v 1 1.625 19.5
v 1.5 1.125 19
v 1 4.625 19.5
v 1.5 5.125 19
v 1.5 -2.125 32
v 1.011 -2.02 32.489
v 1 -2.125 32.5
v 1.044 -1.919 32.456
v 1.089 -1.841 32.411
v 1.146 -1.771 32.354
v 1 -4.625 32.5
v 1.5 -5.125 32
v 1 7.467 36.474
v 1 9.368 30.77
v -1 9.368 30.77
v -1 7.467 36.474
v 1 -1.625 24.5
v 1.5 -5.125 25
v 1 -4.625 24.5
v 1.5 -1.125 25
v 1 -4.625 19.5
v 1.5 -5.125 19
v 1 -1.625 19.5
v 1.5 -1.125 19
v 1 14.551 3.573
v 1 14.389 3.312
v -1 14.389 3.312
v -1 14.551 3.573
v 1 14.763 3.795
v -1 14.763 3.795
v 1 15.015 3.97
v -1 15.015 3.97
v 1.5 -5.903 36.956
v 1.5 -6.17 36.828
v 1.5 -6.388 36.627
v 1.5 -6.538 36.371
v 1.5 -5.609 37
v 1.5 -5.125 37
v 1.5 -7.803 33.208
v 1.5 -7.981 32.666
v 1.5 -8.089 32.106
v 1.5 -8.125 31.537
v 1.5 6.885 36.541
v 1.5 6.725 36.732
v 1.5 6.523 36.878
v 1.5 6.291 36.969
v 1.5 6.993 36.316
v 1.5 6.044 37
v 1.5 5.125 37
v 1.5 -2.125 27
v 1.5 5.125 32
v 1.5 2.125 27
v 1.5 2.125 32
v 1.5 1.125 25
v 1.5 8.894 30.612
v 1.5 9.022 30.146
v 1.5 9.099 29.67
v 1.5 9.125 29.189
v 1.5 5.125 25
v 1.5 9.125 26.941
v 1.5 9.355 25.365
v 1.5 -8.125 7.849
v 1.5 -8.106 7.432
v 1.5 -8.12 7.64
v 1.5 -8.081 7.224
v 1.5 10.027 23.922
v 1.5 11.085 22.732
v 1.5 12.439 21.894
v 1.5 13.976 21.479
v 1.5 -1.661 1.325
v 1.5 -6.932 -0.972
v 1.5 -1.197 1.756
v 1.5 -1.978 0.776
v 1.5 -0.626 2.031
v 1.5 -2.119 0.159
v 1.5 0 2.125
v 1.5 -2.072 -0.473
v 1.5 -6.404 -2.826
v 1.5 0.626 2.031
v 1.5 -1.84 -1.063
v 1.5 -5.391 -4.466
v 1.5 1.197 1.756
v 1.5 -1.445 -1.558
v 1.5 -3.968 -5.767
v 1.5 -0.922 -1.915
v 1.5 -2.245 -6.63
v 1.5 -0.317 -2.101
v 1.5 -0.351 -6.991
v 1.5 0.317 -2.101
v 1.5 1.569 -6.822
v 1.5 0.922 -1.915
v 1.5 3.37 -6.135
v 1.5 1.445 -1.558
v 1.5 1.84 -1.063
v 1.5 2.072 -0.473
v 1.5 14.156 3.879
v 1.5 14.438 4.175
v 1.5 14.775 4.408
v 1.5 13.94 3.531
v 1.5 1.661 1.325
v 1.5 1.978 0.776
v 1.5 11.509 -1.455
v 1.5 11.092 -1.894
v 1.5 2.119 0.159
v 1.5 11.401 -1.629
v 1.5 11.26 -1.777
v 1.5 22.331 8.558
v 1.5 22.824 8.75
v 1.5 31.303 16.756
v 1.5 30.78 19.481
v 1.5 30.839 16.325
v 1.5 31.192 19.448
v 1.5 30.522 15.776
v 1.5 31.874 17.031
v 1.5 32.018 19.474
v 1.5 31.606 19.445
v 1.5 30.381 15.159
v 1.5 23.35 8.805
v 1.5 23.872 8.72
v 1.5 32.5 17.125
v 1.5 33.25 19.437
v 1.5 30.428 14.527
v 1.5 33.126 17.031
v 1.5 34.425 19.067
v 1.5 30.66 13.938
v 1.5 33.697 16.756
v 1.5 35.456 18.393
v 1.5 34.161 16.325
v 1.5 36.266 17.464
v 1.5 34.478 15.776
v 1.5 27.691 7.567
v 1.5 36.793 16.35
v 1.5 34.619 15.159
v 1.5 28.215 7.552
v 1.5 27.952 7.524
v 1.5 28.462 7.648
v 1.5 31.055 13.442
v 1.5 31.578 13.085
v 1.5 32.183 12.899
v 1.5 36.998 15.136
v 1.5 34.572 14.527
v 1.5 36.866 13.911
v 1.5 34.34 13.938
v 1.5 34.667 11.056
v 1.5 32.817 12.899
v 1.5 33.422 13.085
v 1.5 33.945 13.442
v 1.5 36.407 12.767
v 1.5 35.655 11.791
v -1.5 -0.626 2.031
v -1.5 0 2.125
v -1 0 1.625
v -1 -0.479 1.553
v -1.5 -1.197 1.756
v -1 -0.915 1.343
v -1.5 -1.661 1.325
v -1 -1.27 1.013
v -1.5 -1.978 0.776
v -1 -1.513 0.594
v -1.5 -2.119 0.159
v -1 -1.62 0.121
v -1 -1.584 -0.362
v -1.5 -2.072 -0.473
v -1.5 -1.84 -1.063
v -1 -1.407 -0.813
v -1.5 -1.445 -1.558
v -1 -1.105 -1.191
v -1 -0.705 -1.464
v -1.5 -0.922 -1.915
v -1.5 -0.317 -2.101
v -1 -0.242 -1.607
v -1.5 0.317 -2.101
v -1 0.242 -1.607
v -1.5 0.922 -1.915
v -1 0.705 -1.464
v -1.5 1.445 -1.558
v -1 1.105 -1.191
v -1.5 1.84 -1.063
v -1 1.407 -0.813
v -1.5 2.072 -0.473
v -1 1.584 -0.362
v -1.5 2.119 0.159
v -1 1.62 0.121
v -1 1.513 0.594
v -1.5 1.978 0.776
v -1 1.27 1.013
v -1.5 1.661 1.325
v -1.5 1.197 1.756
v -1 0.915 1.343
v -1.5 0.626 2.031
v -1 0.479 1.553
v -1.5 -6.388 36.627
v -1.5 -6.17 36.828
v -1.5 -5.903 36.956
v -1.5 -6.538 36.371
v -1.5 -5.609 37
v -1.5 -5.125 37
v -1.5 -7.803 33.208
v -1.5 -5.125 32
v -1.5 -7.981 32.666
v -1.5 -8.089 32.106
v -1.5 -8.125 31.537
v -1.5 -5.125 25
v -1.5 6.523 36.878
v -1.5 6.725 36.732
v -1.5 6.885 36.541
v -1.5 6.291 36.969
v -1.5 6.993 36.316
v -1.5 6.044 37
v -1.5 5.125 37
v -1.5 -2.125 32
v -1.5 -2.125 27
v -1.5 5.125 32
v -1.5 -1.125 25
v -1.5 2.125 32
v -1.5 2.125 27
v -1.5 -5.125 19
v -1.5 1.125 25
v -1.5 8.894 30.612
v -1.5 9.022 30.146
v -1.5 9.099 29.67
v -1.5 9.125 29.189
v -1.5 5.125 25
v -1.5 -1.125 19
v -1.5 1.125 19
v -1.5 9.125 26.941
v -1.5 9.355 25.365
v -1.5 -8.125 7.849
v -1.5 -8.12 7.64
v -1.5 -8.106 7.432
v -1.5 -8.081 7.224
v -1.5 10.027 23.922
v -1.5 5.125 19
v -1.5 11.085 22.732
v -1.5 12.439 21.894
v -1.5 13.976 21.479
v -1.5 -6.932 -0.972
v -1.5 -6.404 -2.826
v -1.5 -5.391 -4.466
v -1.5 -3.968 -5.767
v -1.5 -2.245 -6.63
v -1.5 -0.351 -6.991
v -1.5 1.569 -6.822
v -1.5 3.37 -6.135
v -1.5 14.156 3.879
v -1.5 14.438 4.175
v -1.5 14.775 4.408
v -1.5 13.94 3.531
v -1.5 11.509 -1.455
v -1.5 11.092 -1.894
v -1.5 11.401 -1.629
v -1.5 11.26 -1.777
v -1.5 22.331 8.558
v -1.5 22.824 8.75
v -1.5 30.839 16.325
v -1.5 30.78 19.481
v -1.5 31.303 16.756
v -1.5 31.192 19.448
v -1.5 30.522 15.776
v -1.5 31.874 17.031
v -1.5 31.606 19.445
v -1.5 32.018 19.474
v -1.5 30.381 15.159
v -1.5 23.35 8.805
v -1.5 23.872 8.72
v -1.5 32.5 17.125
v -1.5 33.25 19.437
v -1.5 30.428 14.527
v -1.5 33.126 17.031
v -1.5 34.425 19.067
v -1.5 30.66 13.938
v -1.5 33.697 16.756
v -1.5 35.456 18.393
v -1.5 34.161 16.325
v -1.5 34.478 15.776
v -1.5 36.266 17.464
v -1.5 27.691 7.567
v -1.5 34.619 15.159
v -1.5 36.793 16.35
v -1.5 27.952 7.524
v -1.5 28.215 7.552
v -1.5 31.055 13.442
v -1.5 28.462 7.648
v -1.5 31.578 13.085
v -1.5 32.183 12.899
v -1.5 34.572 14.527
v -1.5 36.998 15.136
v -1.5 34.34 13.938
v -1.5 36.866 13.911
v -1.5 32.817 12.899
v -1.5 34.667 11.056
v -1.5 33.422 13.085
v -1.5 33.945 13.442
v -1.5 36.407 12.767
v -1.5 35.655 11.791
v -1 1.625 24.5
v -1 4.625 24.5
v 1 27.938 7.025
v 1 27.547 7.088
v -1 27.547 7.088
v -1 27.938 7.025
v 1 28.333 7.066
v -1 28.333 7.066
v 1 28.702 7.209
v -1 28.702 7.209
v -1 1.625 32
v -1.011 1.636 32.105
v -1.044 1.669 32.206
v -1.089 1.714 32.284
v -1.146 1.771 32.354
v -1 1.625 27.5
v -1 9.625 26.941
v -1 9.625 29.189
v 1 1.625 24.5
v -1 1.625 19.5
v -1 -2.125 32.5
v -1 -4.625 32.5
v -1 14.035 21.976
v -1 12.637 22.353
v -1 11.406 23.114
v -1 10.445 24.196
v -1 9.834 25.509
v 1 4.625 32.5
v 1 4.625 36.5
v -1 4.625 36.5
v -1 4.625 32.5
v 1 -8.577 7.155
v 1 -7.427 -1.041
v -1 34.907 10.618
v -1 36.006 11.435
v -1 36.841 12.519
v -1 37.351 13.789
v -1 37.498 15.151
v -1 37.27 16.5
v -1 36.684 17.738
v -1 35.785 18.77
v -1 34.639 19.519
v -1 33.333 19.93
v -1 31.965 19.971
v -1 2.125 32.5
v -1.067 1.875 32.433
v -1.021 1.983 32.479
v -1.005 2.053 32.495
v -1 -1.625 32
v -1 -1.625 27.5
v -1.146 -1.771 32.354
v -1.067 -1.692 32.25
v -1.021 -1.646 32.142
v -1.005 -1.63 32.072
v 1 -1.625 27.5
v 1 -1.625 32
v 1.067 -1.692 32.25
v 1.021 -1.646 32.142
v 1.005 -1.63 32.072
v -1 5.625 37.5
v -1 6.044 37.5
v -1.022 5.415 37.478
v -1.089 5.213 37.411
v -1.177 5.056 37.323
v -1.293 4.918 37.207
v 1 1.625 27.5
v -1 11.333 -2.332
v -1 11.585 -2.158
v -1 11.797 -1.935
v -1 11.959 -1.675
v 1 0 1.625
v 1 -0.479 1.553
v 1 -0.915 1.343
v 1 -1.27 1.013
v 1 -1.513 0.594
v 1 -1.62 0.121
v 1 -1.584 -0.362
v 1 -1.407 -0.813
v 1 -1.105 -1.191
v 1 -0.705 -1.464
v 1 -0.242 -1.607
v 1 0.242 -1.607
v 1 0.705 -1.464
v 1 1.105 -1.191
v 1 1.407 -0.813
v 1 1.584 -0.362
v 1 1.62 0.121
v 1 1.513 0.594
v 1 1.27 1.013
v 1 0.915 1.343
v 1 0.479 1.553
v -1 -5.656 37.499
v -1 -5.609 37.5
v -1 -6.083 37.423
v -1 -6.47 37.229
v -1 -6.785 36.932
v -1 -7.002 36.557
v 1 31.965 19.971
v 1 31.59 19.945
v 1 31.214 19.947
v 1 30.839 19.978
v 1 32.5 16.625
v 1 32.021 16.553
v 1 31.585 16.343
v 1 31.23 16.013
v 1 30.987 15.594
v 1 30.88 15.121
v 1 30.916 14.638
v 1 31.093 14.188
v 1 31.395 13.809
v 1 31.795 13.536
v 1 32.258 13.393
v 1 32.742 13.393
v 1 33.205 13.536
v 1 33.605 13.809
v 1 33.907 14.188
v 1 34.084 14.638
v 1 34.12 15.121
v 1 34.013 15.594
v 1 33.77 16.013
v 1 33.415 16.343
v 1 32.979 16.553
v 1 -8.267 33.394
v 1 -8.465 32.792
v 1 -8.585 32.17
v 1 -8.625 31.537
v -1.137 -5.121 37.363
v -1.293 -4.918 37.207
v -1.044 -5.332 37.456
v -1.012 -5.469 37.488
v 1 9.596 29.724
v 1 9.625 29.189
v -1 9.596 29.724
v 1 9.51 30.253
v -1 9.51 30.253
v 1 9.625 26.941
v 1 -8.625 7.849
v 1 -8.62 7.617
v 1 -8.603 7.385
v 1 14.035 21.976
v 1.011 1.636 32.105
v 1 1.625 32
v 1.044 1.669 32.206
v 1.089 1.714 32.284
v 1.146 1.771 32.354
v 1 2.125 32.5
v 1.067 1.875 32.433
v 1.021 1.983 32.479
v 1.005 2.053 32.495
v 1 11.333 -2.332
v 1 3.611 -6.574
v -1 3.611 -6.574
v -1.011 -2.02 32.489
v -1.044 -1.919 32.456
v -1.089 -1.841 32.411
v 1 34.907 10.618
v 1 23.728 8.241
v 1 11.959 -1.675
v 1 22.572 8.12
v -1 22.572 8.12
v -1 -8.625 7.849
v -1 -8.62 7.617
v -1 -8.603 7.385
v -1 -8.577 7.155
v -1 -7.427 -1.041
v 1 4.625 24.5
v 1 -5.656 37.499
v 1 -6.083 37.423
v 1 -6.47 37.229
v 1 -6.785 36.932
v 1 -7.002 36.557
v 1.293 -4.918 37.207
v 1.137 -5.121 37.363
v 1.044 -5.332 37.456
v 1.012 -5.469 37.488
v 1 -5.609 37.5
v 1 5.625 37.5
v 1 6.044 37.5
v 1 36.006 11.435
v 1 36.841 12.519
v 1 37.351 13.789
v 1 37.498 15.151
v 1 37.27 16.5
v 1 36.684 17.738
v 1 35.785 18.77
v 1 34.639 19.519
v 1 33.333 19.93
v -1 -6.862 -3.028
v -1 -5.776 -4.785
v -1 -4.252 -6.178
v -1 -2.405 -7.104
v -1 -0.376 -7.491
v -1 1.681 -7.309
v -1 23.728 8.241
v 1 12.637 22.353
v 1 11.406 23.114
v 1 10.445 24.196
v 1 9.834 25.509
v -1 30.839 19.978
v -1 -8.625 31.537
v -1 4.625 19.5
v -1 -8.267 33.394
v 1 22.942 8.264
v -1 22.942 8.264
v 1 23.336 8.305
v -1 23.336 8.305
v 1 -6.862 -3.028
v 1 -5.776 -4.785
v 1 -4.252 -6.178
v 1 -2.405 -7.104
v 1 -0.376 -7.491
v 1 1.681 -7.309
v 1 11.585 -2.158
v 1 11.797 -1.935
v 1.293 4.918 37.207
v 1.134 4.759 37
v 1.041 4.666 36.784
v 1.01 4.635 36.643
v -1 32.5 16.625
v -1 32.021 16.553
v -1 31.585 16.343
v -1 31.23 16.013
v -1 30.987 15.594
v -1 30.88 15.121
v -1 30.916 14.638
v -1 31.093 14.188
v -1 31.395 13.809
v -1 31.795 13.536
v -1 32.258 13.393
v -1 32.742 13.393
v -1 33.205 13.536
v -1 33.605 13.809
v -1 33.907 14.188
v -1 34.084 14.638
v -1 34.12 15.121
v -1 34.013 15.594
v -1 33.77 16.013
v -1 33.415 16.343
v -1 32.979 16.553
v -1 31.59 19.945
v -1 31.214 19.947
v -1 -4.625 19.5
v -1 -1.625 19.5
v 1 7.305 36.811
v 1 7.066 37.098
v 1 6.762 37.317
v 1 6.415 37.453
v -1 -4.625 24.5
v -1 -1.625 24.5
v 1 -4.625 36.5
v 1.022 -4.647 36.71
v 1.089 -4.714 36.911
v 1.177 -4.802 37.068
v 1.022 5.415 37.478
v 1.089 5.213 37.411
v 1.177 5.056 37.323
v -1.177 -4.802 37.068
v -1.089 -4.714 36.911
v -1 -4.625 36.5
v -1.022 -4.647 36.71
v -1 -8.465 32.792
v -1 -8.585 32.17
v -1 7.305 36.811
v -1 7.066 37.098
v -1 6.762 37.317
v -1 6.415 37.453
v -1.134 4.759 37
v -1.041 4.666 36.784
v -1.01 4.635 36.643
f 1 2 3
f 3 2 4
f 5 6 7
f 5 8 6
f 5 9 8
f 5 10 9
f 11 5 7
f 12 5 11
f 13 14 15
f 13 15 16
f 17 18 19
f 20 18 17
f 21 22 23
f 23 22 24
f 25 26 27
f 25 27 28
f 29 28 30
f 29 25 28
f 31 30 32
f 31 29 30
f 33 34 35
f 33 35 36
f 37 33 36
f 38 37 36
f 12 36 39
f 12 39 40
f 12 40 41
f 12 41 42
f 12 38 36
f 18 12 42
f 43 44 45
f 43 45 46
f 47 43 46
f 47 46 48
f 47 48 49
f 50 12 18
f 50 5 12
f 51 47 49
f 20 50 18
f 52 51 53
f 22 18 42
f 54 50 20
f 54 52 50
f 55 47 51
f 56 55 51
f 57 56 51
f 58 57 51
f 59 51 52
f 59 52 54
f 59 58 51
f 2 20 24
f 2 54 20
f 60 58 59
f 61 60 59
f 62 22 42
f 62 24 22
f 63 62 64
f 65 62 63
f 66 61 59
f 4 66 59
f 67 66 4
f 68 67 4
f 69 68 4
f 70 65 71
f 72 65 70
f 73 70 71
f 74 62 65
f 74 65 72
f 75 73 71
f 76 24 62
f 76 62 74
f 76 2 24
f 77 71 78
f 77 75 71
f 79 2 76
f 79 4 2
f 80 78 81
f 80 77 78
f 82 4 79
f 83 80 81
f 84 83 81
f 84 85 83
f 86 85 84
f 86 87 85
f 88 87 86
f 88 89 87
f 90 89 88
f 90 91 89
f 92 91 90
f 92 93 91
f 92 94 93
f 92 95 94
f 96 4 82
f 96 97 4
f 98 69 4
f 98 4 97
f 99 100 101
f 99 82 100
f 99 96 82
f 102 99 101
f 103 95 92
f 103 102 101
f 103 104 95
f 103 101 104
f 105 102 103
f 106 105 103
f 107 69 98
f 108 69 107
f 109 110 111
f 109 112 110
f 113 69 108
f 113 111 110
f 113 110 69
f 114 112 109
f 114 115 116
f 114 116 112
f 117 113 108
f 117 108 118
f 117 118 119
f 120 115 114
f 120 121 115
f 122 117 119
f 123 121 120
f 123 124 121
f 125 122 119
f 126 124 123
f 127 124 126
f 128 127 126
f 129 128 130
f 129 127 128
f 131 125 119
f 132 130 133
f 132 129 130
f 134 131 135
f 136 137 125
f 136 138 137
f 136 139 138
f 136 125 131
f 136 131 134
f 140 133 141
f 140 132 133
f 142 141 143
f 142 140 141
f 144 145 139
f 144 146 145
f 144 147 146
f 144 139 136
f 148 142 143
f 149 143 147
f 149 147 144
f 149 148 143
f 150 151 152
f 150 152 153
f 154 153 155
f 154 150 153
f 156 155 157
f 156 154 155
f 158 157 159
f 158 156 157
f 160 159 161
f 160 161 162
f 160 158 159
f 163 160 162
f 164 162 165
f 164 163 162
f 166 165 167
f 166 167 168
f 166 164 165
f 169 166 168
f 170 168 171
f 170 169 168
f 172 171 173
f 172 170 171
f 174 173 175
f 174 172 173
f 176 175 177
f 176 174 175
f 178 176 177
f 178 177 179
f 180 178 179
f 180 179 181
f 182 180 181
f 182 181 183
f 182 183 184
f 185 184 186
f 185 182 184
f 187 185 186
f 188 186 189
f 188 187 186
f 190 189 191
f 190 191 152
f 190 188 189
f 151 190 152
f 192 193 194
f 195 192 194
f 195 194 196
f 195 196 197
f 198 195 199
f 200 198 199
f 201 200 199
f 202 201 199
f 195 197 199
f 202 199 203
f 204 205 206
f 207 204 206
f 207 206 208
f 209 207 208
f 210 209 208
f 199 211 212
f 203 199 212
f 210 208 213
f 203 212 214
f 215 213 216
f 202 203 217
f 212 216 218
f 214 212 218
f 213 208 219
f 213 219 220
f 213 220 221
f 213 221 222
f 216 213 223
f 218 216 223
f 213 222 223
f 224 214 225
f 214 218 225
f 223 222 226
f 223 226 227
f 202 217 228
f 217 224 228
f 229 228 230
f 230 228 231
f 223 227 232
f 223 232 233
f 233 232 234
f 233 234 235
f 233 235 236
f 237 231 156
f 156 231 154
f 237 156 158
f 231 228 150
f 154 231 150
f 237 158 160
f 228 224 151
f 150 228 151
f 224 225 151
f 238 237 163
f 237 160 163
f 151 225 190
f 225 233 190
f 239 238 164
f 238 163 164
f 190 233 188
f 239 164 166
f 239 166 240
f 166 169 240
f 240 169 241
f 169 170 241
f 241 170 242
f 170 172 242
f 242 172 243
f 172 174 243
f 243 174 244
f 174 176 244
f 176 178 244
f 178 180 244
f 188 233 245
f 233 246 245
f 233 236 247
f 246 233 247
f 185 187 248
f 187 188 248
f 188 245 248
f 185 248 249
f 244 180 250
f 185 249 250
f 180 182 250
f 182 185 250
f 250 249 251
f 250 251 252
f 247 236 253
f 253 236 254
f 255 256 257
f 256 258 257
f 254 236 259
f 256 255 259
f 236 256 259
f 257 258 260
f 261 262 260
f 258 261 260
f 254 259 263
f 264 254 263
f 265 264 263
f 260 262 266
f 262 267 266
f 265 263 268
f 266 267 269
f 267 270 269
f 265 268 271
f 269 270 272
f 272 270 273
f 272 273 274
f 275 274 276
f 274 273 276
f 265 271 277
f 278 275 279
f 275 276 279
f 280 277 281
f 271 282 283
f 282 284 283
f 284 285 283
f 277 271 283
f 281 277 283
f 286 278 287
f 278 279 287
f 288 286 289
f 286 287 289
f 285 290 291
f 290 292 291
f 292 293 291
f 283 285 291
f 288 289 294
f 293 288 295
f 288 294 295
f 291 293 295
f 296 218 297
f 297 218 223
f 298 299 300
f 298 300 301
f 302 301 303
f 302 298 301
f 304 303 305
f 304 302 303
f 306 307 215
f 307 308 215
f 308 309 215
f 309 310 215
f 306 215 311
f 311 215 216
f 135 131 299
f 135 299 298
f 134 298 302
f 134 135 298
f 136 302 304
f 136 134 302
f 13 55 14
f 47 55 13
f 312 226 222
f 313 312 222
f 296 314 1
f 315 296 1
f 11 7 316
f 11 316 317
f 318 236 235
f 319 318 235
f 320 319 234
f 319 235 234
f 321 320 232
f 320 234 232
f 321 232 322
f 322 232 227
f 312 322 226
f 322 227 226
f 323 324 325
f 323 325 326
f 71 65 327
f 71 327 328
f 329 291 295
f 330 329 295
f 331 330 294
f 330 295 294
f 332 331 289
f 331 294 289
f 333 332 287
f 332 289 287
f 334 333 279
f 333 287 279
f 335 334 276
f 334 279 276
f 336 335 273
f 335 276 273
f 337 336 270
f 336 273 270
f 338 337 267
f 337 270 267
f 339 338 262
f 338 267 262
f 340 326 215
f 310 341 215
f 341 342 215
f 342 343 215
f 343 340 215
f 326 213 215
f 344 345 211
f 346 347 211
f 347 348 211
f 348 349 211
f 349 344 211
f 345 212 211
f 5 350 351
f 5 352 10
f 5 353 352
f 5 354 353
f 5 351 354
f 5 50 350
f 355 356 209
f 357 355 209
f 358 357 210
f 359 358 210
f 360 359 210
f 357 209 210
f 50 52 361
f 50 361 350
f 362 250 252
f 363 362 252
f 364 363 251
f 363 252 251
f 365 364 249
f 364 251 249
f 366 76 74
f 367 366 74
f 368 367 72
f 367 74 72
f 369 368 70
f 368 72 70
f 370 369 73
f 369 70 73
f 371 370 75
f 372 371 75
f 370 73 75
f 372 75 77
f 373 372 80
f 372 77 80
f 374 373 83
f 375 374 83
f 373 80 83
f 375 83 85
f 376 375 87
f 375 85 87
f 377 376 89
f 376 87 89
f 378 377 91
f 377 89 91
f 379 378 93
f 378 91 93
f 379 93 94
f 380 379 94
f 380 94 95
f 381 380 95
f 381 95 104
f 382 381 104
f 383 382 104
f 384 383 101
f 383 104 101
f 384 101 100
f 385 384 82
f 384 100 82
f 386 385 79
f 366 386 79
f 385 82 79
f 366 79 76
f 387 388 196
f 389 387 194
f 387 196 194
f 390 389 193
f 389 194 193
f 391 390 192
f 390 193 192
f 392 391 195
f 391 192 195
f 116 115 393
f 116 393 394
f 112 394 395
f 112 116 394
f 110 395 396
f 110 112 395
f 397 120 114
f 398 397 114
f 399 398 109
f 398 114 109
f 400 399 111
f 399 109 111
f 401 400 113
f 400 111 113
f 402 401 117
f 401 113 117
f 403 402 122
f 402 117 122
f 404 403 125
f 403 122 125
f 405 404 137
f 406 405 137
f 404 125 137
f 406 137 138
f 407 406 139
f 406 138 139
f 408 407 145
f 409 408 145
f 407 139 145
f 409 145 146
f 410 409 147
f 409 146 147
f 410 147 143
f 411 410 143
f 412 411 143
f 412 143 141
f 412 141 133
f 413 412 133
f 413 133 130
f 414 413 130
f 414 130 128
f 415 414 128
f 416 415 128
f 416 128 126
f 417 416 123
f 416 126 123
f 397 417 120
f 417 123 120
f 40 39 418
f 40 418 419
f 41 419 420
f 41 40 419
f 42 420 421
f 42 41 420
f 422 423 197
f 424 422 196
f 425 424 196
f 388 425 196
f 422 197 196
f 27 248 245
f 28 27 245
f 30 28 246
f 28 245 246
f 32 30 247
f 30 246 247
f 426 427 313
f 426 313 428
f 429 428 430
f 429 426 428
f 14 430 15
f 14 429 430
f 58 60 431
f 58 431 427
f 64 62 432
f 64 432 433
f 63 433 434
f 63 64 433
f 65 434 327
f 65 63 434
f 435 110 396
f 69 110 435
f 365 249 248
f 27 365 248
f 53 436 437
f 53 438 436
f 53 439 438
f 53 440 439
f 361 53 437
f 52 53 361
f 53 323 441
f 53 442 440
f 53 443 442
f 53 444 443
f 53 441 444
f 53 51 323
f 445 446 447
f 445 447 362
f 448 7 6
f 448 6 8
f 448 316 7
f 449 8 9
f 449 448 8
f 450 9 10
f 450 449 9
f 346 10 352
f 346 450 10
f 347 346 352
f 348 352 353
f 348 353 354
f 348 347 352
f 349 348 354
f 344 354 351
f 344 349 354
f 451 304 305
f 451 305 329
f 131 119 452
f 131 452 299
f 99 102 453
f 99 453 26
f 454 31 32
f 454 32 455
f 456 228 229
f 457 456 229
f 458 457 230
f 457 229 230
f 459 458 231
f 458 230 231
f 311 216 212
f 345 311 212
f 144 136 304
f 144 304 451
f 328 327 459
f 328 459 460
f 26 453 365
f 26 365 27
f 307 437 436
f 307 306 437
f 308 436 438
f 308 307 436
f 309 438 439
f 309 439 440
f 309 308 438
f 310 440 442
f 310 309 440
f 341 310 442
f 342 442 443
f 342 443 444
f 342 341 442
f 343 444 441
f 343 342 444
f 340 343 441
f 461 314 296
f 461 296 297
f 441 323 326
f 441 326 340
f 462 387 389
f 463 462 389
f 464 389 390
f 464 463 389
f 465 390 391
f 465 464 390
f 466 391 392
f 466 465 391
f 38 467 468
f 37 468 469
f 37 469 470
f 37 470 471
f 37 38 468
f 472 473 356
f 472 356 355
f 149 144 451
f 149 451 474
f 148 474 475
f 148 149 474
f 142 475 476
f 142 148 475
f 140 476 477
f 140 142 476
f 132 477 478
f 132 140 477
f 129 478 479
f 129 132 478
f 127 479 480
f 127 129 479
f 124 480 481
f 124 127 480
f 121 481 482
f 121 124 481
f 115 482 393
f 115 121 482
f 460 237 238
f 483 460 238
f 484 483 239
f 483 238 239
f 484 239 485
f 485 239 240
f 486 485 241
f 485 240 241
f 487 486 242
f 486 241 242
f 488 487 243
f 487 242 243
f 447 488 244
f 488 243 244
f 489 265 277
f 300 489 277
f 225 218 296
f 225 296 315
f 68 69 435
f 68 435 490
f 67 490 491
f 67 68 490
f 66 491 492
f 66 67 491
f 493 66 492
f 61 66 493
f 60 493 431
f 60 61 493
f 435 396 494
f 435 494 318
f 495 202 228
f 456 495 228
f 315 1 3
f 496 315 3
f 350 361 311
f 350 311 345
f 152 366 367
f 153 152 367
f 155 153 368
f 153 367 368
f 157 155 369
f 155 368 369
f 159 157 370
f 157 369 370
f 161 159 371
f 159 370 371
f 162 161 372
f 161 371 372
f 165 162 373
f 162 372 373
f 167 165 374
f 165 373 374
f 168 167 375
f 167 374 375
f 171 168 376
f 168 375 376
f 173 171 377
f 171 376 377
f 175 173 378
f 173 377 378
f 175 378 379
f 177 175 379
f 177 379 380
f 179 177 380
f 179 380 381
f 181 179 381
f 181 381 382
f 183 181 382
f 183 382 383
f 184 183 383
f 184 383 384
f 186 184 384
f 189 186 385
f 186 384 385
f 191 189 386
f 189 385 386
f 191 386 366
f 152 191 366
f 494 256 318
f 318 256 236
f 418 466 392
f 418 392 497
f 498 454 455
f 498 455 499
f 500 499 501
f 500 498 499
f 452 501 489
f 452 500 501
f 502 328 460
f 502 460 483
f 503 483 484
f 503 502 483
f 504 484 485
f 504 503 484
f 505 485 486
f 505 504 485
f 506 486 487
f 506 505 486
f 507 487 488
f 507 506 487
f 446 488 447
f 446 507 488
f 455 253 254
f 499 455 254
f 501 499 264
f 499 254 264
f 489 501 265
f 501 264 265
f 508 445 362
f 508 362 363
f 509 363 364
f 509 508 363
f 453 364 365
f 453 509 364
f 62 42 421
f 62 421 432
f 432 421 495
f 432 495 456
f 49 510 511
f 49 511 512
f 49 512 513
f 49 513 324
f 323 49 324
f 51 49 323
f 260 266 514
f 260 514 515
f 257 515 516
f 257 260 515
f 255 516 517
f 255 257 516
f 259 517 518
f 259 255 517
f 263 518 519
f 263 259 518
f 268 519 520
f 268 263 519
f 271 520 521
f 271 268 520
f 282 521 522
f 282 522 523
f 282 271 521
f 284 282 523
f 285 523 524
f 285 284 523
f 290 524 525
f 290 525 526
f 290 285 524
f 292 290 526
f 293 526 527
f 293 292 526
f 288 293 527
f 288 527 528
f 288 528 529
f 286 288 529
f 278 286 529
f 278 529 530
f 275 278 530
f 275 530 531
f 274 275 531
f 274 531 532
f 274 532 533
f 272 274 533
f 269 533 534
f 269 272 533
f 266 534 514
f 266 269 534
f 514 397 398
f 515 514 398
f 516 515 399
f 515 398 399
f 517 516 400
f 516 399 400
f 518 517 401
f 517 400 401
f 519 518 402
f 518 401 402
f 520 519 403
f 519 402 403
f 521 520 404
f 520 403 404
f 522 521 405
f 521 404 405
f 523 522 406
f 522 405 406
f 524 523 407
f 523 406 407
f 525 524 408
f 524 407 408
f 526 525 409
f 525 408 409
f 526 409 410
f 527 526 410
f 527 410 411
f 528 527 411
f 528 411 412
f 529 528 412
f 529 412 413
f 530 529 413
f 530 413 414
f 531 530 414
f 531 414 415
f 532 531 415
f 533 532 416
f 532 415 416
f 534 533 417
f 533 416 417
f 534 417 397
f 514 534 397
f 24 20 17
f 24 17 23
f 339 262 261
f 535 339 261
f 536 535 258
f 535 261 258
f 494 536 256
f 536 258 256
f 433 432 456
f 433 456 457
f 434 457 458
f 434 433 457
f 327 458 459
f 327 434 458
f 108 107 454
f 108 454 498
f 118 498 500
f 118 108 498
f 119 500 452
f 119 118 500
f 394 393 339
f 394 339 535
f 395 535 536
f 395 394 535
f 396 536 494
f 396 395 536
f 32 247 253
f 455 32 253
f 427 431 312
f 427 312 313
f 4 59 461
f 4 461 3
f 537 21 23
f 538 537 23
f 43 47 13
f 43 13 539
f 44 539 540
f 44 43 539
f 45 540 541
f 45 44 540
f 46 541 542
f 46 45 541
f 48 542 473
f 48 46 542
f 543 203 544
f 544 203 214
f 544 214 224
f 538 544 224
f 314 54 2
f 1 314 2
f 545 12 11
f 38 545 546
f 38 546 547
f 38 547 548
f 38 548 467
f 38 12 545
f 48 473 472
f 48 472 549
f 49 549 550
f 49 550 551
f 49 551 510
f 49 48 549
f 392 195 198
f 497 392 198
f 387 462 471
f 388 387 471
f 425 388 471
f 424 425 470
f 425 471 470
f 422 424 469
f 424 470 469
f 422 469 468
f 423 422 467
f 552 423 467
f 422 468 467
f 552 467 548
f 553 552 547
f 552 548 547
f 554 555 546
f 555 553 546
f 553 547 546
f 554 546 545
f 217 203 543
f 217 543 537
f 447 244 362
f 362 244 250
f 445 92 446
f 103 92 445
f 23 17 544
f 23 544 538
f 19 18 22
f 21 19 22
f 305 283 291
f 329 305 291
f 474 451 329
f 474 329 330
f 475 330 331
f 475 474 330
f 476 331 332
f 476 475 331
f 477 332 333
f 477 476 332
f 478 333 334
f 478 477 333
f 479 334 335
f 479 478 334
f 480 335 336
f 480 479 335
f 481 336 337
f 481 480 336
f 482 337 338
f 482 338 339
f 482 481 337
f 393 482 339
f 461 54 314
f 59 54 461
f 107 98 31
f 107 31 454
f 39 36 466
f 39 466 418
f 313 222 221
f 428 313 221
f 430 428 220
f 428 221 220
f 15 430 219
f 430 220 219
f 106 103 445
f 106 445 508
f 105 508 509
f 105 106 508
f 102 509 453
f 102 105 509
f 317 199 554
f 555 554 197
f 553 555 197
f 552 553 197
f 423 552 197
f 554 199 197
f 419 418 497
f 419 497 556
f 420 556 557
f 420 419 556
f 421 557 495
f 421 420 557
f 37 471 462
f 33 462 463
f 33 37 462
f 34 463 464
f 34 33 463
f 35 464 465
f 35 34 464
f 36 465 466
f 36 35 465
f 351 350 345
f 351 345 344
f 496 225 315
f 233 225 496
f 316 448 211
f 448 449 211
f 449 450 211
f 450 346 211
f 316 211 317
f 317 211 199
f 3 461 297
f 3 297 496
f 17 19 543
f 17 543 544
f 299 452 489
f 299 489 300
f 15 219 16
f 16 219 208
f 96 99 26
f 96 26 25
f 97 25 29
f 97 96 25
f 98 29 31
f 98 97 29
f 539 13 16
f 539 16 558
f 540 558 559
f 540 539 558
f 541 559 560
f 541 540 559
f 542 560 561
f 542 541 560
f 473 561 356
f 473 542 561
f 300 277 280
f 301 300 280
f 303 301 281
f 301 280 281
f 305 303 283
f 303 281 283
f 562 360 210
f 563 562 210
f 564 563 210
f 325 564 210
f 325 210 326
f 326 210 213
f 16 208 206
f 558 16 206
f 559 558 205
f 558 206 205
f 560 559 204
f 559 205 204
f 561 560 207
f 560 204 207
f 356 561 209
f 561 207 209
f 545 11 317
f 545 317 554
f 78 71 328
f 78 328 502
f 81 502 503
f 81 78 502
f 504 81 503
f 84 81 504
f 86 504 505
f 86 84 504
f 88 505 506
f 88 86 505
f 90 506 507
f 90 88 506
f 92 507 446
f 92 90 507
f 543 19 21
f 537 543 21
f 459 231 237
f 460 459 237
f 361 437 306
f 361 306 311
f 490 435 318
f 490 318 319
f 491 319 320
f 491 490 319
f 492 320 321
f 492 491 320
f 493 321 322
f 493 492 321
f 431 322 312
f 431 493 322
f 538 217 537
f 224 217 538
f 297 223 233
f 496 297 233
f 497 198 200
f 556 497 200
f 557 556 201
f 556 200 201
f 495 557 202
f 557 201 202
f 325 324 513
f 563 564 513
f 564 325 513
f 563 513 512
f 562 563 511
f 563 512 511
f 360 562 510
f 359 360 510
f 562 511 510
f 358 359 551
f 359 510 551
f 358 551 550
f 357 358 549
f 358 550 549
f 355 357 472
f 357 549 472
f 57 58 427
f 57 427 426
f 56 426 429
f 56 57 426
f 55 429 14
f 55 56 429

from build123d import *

# Parameters (mm, degrees)
SKETCH_1_R      = 1.625
SKETCH_1_W      = 5
SKETCH_1_H      = 3
EXTRUDE_1_DEPTH = 3
CHAMFER_1_SIZE  = 0.5
FILLET_1_R      = 1
FILLET_2_R      = 0.5
EXTRUDE_2_DEPTH = 3


with BuildPart() as part:
    # 草图1 → 凸台-拉伸1 (new body)
    with BuildSketch(Plane(origin=(1.5, 0, 0), x_dir=(0, 0, -1), z_dir=(1, 0, 0))):
        with BuildLine():
            Line((-7.154542269, -8.576560818), (1.041442411, -7.427341227))
            ThreePointArc((1.041442411, -7.427341227), (6.705040976, -3.360420437), (6.573553871, 3.610871017))
            Line((6.573553871, 3.610871017), (2.332034096, 11.332514521))
            ThreePointArc((2.332034096, 11.332514521), (2.051803428, 11.696549741), (1.674538126, 11.958698097))
            Line((1.674538126, 11.958698097), (-3.312005463, 14.389232718))
            ThreePointArc((-3.312005463, 14.389232718), (-3.689270765, 14.651381075), (-3.969501433, 15.015416295))
            Line((-3.969501433, 15.015416295), (-8.120214479, 22.571747074))
            ThreePointArc((-8.120214479, 22.571747074), (-8.297319992, 23.137447109), (-8.241448295, 23.727583743))
            Line((-8.241448295, 23.727583743), (-7.088083158, 27.546610192))
            ThreePointArc((-7.088083158, 27.546610192), (-7.032211461, 28.136746826), (-7.209316974, 28.702446861))
            Line((-7.209316974, 28.702446861), (-10.617630753, 34.907247345))
            ThreePointArc((-10.617630753, 34.907247345), (-16.500374515, 37.269578211), (-19.97127937, 31.964853827))
            ThreePointArc((-19.97127937, 31.964853827), (-19.942635933, 31.401924032), (-19.977533596, 30.839347323))
            Line((-19.977533596, 30.839347323), (-21.975677109, 14.034639668))
            ThreePointArc((-21.975677109, 14.034639668), (-23.620446364, 10.886564387), (-26.940702253, 9.625))
            Line((-26.940702253, 9.625), (-29.188611699, 9.625))
            ThreePointArc((-29.188611699, 9.625), (-29.989522914, 9.560437288), (-30.769750529, 9.36841649))
            Line((-30.769750529, 9.36841649), (-36.474341649, 7.466886117))
            ThreePointArc((-36.474341649, 7.466886117), (-37.216863278, 6.920926597), (-37.5, 6.04386117))
            Line((-37.5, 6.04386117), (-37.5, 4.625))
            Line((-37.5, 4.625), (-32.5, 4.625))
            Line((-32.5, 4.625), (-32.5, 1.625))
            Line((-32.5, 1.625), (-27.5, 1.625))
            Line((-27.5, 1.625), (-27.5, -1.625))
            Line((-27.5, -1.625), (-32.5, -1.625))
            Line((-32.5, -1.625), (-32.5, -4.625))
            Line((-32.5, -4.625), (-37.5, -4.625))
            Line((-37.5, -4.625), (-37.5, -5.609450558))
            ThreePointArc((-37.5, -5.609450558), (-37.242100846, -6.450393772), (-36.557086015, -7.002165594))
            Line((-36.557086015, -7.002165594), (-33.394041364, -8.267383454))
            ThreePointArc((-33.394041364, -8.267383454), (-32.482625588, -8.534781934), (-31.537087982, -8.625))
            Line((-31.537087982, -8.625), (-7.848837209, -8.625))
            ThreePointArc((-7.848837209, -8.625), (-7.500845895, -8.612875504), (-7.154542269, -8.576560818))
        make_face()
        with Locations(Location((-15, 32.5, 0), (0, 0, 180))):
            Circle(SKETCH_1_R, mode=Mode.SUBTRACT)
        with Locations(Location((0, 0, 0), (0, 0, 180))):
            Circle(SKETCH_1_R, mode=Mode.SUBTRACT)
        with Locations((-22, 3.125)):
            Rectangle(SKETCH_1_W, SKETCH_1_H, mode=Mode.SUBTRACT)
        with Locations((-22, -3.125)):
            Rectangle(SKETCH_1_W, SKETCH_1_H, mode=Mode.SUBTRACT)
        with BuildLine():
            Line((-9.961966793, 5.476712688), (-17.295484898, 21.366001917))
            ThreePointArc((-17.295484898, 21.366001917), (-16.439907786, 23.68828265), (-14.117627052, 22.832705538))
            Line((-14.117627052, 22.832705538), (-6.784108947, 6.943416309))
            ThreePointArc((-6.784108947, 6.943416309), (-7.639686059, 4.621135575), (-9.961966793, 5.476712688))
        make_face(mode=Mode.SUBTRACT)
    extrude(amount=-EXTRUDE_1_DEPTH)

    # 倒角1
    chamfer_1_edges = [part.edges().sort_by_distance(p)[0] for p in [
        (-1.5, 0, 27.5),
        (-1.5, -3.125, 24.5),
        (-1.5, -1.625, 22),
        (-1.5, -3.125, 19.5),
        (-1.5, -4.625, 22),
        (1.5, -3.125, 24.5),
        (1.5, -4.625, 22),
        (1.5, -3.125, 19.5),
        (-1.5, -1.625, 30),
        (1.5, -1.625, 22),
        (-1.5, -3.125, 32.5),
        (-1.5, -4.625, 35),
        (-1.5, 4.621135575, 7.639686059),
        (-1.5, 13.421357302, 13.628725845),
        (-1.5, 23.68828265, 16.439907786),
        (-1.5, 14.888060923, 10.450868),
        (-1.5, -5.117225279, 37.5),
        (1.5, 4.621135575, 7.639686059),
        (1.5, 14.888060923, 10.450868),
        (1.5, 23.68828265, 16.439907786),
        (1.5, 13.421357302, 13.628725845),
        (-1.5, -6.450393772, 37.242100846),
        (-1.5, -7.634774524, 34.975563689),
        (-1.5, -8.534781934, 32.482625588),
        (-1.5, -3.360420437, -6.705040976),
        (-1.5, -8.625, 19.692962596),
        (-1.5, 7.471692769, -4.452793984),
        (-1.5, 11.696549741, -2.051803428),
        (-1.5, 13.173965408, 0.818733668),
        (-1.5, 14.651381075, 3.689270765),
        (1.5, -8.625, 19.692962596),
        (1.5, -8.534781934, 32.482625588),
        (1.5, -7.634774524, 34.975563689),
        (1.5, -6.450393772, 37.242100846),
        (1.5, -5.117225279, 37.5),
        (-1.5, 18.793581684, 6.044857956),
        (1.5, -4.625, 35),
        (1.5, -3.125, 32.5),
        (1.5, -1.625, 30),
        (1.5, 0, 27.5),
        (1.5, 1.625, 30),
        (1.5, 3.125, 32.5),
        (1.5, 4.625, 35),
        (1.5, 5.334430585, 37.5),
        (1.5, 6.920926597, 37.216863278),
        (1.5, 8.417651304, 33.622046089),
        (-1.5, 23.137447109, 8.297319992),
        (1.5, 9.560437288, 29.989522914),
        (1.5, 9.625, 28.064656976),
        (1.5, 10.886564387, 23.620446364),
        (1.5, 22.436993496, 20.976605353),
        (1.5, 31.401924032, 19.942635933),
        (1.5, 37.269578211, 16.500374515),
        (1.5, 31.804847103, 8.913473863),
        (1.5, 28.136746826, 7.032211461),
        (1.5, 25.637096968, 7.664765726),
        (1.5, 23.137447109, 8.297319992),
        (-1.5, 25.637096968, 7.664765726),
        (1.5, 18.793581684, 6.044857956),
        (1.5, 14.651381075, 3.689270765),
        (1.5, 13.173965408, 0.818733668),
        (1.5, 11.696549741, -2.051803428),
        (1.5, 7.471692769, -4.452793984),
        (1.5, -3.360420437, -6.705040976),
        (1.5, -8.001951023, 3.056549929),
        (1.5, -8.612875504, 7.500845895),
        (-1.5, 28.136746826, 7.032211461),
        (-1.5, 31.804847103, 8.913473863),
        (-1.5, -8.612875504, 7.500845895),
        (-1.5, 37.269578211, 16.500374515),
        (-1.5, 31.401924032, 19.942635933),
        (-1.5, 22.436993496, 20.976605353),
        (-1.5, 10.886564387, 23.620446364),
        (-1.5, 9.625, 28.064656976),
        (-1.5, 9.560437288, 29.989522914),
        (-1.5, 8.417651304, 33.622046089),
        (-1.5, 32.5, 13.375),
        (1.5, 32.5, 13.375),
        (-1.5, 6.920926597, 37.216863278),
        (-1.5, 0, -1.625),
        (1.5, 0, -1.625),
        (-1.5, 5.334430585, 37.5),
        (-1.5, 4.625, 35),
        (-1.5, 3.125, 19.5),
        (-1.5, -8.001951023, 3.056549929),
        (-1.5, 1.625, 22),
        (-1.5, 3.125, 24.5),
        (-1.5, 4.625, 22),
        (1.5, 3.125, 19.5),
        (1.5, 4.625, 22),
        (1.5, 3.125, 24.5),
        (1.5, 1.625, 22),
        (-1.5, 3.125, 32.5),
        (-1.5, 1.625, 30),
    ]]
    chamfer(chamfer_1_edges, length=CHAMFER_1_SIZE)

    # 圆角1
    # the kernel refuses this fillet: 1 mm, written as the material it takes off along each edge
    with BuildSketch(Plane(origin=(3.577747849, -4.625, 37.5), x_dir=(0, -0.9999997524396673, -0.000703648068189184), z_dir=(-1, 0, 0))) as fillet_1_piece_1:
        with BuildLine():
            CenterArc((1.000703571, -0.999537948), FILLET_1_R, 88.258193912, 91.782122156)
            Line((0.000703818, -1.000241596), (-0.099296157, -1.000311961))
            Line((-0.099296157, -1.000311961), (-0.099999975, -7.0365e-05))
            Line((-0.099999975, -7.0365e-05), (-7.0365e-05, 0.099999975))
            ThreePointArc((-7.0365e-05, 0.099999975), (0.984379949, 0.100692682), (1.034138696, 0.099953795))
            Line((1.034138696, 0.099953795), (1.03109914, 0))
        make_face()
    extrude(amount=7.155495698, mode=Mode.SUBTRACT)
    with BuildSketch(Plane(origin=(3.5, 4.625, 37.5), x_dir=(0, 0, -1), z_dir=(-1, 0, 0))) as fillet_1_piece_2:
        with BuildLine():
            CenterArc((FILLET_1_R, -FILLET_1_R), FILLET_1_R, 90, 90)
            Line((0, -FILLET_1_R), (0, 0))
            Line((0, 0), (FILLET_1_R, 0))
        make_face()
    extrude(amount=7, mode=Mode.SUBTRACT)

    # 圆角2
    fillet_2_edges = [part.edges().sort_by_distance(p)[0] for p in [
        (0, 1.625, 32.5),
        (0, -1.625, 32.5),
    ]]
    fillet(fillet_2_edges, radius=FILLET_2_R)

    # Sketch 3D_1 → 凸台-拉伸2 (add)
    with BuildSketch(Plane(origin=(1.5, 22.89191641, 19.156270075), x_dir=(0, -0.8525521578237779, -0.5226421511799639), z_dir=(1, 0, 0))):
        Polygon((0, 0), (16.191873752, -5.770917197), (27.468575768, 0), (19.557121084, 8.11942404), (6.27778787, 5.658813531), (-1.099641064, 7.65553458), (-1.226258679, 2.829349925), align=None)
    extrude(amount=-EXTRUDE_2_DEPTH)


solid = part.part
